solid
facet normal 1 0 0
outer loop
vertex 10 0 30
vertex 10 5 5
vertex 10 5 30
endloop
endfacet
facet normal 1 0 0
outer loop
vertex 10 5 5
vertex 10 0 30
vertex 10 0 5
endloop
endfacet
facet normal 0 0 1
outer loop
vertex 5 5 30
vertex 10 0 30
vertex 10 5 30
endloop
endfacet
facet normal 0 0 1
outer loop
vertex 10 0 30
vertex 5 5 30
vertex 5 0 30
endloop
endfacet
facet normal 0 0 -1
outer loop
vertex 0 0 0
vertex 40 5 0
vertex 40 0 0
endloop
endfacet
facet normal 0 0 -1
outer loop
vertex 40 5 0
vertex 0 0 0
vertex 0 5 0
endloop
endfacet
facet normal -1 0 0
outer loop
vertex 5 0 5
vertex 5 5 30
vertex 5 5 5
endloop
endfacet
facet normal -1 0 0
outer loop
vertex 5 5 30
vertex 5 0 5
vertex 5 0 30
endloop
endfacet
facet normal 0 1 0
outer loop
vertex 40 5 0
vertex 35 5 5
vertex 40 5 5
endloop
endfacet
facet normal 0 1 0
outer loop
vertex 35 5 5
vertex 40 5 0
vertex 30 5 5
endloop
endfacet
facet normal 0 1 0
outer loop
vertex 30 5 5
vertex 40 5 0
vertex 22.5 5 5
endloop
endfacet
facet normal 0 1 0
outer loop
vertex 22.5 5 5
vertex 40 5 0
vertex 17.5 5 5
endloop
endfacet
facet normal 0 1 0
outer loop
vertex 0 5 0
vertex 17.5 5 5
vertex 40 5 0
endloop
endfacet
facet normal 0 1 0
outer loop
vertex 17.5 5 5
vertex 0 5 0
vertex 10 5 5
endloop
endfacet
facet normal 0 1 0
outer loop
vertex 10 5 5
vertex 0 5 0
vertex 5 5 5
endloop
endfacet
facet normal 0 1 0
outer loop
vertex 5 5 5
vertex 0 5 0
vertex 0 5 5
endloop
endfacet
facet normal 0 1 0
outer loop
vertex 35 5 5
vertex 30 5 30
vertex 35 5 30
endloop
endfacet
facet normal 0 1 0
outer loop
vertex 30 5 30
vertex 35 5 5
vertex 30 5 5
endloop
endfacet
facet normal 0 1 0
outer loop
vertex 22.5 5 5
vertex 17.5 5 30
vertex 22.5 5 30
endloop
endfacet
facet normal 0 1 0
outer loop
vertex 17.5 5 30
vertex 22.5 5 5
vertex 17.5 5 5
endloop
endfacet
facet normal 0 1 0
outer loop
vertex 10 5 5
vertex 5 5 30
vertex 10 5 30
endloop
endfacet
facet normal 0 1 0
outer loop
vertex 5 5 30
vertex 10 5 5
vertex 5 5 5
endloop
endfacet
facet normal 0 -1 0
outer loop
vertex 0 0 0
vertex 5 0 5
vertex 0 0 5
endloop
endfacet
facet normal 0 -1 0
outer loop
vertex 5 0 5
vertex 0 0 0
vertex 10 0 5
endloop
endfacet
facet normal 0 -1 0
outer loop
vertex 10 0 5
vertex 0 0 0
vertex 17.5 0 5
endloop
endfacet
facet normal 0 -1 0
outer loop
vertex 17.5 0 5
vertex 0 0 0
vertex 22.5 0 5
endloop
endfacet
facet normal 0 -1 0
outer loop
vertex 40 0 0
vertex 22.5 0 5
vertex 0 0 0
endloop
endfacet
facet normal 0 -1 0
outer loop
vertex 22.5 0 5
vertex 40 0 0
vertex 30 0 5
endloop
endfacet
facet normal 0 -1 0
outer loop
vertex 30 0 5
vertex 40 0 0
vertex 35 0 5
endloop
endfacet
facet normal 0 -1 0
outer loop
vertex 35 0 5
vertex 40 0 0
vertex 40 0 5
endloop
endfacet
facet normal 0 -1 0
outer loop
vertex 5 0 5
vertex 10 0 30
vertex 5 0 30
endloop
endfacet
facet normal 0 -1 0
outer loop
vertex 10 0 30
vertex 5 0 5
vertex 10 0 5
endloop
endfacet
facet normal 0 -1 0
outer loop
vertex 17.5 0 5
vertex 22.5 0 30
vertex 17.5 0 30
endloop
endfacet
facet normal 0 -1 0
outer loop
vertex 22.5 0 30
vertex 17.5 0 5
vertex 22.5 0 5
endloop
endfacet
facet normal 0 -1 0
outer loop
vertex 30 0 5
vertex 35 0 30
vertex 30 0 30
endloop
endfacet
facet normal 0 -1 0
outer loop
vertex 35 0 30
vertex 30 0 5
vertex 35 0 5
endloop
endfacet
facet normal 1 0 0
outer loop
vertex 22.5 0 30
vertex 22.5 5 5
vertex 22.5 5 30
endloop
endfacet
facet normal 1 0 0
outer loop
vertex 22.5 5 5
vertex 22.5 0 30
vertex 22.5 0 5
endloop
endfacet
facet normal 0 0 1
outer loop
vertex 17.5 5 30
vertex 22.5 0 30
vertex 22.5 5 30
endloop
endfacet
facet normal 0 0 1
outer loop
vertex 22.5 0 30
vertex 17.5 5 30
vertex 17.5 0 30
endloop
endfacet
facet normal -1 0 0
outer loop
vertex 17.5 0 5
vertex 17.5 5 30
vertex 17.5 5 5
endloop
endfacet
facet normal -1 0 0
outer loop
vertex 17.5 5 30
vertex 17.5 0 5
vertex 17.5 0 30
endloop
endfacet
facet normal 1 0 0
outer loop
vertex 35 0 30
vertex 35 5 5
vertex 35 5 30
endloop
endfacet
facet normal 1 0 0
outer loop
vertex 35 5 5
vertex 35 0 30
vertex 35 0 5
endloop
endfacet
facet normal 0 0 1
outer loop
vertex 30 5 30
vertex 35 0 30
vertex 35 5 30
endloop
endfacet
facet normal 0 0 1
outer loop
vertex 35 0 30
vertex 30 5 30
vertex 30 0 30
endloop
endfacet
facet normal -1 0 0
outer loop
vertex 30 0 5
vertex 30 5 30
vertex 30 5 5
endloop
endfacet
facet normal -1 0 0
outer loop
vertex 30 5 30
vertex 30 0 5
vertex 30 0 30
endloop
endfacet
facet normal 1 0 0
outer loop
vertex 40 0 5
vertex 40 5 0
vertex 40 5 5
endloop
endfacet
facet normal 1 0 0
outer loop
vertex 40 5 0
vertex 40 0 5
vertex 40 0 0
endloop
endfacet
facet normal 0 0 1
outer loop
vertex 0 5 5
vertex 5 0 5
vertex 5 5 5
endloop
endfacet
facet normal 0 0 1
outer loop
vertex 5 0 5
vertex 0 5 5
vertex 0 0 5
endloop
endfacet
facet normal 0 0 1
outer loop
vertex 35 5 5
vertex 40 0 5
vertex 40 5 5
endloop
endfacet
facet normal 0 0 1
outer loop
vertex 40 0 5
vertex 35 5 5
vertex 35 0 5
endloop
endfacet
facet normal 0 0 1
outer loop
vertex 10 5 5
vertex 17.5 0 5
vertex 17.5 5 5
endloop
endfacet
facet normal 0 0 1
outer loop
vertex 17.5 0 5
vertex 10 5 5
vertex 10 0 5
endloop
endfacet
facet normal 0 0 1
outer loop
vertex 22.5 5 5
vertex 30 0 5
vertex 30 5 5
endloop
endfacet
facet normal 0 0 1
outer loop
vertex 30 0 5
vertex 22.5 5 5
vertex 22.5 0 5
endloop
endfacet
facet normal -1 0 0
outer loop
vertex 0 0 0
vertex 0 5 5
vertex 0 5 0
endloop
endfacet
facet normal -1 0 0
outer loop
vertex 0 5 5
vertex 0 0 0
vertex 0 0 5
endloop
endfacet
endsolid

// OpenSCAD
// Example:
color("red")
cube([ 40, 5, 5 ]);
color("green")
distributeChildren(
  alongX = 40,
  childX = 5,
  paddingX = 5
) {
  cube([ 5, 5, 30 ]);
  cube([ 5, 5, 30 ]);
  cube([ 5, 5, 30 ]);
}

module distributeChildren(
  alongX, // space available for distributing the children into
  childX = 0, // i.e. the width of a single child
  paddingX = 0 // distance of 1st and last children "from the sides"
) {
  if ($children == 1) {
    // A single child is just centered:
    translate([ alongX / 2 - childX / 2, 0, 0 ]) children(0);
  } else {
    // More children will be distributed:
    for (i = [ 0 : $children - 1 ]) {
      x = paddingX + (alongX - paddingX * 2 - childX) / ($children - 1) * i;
      translate([ x, 0, 0 ]) children(i);
    }
  }
}
